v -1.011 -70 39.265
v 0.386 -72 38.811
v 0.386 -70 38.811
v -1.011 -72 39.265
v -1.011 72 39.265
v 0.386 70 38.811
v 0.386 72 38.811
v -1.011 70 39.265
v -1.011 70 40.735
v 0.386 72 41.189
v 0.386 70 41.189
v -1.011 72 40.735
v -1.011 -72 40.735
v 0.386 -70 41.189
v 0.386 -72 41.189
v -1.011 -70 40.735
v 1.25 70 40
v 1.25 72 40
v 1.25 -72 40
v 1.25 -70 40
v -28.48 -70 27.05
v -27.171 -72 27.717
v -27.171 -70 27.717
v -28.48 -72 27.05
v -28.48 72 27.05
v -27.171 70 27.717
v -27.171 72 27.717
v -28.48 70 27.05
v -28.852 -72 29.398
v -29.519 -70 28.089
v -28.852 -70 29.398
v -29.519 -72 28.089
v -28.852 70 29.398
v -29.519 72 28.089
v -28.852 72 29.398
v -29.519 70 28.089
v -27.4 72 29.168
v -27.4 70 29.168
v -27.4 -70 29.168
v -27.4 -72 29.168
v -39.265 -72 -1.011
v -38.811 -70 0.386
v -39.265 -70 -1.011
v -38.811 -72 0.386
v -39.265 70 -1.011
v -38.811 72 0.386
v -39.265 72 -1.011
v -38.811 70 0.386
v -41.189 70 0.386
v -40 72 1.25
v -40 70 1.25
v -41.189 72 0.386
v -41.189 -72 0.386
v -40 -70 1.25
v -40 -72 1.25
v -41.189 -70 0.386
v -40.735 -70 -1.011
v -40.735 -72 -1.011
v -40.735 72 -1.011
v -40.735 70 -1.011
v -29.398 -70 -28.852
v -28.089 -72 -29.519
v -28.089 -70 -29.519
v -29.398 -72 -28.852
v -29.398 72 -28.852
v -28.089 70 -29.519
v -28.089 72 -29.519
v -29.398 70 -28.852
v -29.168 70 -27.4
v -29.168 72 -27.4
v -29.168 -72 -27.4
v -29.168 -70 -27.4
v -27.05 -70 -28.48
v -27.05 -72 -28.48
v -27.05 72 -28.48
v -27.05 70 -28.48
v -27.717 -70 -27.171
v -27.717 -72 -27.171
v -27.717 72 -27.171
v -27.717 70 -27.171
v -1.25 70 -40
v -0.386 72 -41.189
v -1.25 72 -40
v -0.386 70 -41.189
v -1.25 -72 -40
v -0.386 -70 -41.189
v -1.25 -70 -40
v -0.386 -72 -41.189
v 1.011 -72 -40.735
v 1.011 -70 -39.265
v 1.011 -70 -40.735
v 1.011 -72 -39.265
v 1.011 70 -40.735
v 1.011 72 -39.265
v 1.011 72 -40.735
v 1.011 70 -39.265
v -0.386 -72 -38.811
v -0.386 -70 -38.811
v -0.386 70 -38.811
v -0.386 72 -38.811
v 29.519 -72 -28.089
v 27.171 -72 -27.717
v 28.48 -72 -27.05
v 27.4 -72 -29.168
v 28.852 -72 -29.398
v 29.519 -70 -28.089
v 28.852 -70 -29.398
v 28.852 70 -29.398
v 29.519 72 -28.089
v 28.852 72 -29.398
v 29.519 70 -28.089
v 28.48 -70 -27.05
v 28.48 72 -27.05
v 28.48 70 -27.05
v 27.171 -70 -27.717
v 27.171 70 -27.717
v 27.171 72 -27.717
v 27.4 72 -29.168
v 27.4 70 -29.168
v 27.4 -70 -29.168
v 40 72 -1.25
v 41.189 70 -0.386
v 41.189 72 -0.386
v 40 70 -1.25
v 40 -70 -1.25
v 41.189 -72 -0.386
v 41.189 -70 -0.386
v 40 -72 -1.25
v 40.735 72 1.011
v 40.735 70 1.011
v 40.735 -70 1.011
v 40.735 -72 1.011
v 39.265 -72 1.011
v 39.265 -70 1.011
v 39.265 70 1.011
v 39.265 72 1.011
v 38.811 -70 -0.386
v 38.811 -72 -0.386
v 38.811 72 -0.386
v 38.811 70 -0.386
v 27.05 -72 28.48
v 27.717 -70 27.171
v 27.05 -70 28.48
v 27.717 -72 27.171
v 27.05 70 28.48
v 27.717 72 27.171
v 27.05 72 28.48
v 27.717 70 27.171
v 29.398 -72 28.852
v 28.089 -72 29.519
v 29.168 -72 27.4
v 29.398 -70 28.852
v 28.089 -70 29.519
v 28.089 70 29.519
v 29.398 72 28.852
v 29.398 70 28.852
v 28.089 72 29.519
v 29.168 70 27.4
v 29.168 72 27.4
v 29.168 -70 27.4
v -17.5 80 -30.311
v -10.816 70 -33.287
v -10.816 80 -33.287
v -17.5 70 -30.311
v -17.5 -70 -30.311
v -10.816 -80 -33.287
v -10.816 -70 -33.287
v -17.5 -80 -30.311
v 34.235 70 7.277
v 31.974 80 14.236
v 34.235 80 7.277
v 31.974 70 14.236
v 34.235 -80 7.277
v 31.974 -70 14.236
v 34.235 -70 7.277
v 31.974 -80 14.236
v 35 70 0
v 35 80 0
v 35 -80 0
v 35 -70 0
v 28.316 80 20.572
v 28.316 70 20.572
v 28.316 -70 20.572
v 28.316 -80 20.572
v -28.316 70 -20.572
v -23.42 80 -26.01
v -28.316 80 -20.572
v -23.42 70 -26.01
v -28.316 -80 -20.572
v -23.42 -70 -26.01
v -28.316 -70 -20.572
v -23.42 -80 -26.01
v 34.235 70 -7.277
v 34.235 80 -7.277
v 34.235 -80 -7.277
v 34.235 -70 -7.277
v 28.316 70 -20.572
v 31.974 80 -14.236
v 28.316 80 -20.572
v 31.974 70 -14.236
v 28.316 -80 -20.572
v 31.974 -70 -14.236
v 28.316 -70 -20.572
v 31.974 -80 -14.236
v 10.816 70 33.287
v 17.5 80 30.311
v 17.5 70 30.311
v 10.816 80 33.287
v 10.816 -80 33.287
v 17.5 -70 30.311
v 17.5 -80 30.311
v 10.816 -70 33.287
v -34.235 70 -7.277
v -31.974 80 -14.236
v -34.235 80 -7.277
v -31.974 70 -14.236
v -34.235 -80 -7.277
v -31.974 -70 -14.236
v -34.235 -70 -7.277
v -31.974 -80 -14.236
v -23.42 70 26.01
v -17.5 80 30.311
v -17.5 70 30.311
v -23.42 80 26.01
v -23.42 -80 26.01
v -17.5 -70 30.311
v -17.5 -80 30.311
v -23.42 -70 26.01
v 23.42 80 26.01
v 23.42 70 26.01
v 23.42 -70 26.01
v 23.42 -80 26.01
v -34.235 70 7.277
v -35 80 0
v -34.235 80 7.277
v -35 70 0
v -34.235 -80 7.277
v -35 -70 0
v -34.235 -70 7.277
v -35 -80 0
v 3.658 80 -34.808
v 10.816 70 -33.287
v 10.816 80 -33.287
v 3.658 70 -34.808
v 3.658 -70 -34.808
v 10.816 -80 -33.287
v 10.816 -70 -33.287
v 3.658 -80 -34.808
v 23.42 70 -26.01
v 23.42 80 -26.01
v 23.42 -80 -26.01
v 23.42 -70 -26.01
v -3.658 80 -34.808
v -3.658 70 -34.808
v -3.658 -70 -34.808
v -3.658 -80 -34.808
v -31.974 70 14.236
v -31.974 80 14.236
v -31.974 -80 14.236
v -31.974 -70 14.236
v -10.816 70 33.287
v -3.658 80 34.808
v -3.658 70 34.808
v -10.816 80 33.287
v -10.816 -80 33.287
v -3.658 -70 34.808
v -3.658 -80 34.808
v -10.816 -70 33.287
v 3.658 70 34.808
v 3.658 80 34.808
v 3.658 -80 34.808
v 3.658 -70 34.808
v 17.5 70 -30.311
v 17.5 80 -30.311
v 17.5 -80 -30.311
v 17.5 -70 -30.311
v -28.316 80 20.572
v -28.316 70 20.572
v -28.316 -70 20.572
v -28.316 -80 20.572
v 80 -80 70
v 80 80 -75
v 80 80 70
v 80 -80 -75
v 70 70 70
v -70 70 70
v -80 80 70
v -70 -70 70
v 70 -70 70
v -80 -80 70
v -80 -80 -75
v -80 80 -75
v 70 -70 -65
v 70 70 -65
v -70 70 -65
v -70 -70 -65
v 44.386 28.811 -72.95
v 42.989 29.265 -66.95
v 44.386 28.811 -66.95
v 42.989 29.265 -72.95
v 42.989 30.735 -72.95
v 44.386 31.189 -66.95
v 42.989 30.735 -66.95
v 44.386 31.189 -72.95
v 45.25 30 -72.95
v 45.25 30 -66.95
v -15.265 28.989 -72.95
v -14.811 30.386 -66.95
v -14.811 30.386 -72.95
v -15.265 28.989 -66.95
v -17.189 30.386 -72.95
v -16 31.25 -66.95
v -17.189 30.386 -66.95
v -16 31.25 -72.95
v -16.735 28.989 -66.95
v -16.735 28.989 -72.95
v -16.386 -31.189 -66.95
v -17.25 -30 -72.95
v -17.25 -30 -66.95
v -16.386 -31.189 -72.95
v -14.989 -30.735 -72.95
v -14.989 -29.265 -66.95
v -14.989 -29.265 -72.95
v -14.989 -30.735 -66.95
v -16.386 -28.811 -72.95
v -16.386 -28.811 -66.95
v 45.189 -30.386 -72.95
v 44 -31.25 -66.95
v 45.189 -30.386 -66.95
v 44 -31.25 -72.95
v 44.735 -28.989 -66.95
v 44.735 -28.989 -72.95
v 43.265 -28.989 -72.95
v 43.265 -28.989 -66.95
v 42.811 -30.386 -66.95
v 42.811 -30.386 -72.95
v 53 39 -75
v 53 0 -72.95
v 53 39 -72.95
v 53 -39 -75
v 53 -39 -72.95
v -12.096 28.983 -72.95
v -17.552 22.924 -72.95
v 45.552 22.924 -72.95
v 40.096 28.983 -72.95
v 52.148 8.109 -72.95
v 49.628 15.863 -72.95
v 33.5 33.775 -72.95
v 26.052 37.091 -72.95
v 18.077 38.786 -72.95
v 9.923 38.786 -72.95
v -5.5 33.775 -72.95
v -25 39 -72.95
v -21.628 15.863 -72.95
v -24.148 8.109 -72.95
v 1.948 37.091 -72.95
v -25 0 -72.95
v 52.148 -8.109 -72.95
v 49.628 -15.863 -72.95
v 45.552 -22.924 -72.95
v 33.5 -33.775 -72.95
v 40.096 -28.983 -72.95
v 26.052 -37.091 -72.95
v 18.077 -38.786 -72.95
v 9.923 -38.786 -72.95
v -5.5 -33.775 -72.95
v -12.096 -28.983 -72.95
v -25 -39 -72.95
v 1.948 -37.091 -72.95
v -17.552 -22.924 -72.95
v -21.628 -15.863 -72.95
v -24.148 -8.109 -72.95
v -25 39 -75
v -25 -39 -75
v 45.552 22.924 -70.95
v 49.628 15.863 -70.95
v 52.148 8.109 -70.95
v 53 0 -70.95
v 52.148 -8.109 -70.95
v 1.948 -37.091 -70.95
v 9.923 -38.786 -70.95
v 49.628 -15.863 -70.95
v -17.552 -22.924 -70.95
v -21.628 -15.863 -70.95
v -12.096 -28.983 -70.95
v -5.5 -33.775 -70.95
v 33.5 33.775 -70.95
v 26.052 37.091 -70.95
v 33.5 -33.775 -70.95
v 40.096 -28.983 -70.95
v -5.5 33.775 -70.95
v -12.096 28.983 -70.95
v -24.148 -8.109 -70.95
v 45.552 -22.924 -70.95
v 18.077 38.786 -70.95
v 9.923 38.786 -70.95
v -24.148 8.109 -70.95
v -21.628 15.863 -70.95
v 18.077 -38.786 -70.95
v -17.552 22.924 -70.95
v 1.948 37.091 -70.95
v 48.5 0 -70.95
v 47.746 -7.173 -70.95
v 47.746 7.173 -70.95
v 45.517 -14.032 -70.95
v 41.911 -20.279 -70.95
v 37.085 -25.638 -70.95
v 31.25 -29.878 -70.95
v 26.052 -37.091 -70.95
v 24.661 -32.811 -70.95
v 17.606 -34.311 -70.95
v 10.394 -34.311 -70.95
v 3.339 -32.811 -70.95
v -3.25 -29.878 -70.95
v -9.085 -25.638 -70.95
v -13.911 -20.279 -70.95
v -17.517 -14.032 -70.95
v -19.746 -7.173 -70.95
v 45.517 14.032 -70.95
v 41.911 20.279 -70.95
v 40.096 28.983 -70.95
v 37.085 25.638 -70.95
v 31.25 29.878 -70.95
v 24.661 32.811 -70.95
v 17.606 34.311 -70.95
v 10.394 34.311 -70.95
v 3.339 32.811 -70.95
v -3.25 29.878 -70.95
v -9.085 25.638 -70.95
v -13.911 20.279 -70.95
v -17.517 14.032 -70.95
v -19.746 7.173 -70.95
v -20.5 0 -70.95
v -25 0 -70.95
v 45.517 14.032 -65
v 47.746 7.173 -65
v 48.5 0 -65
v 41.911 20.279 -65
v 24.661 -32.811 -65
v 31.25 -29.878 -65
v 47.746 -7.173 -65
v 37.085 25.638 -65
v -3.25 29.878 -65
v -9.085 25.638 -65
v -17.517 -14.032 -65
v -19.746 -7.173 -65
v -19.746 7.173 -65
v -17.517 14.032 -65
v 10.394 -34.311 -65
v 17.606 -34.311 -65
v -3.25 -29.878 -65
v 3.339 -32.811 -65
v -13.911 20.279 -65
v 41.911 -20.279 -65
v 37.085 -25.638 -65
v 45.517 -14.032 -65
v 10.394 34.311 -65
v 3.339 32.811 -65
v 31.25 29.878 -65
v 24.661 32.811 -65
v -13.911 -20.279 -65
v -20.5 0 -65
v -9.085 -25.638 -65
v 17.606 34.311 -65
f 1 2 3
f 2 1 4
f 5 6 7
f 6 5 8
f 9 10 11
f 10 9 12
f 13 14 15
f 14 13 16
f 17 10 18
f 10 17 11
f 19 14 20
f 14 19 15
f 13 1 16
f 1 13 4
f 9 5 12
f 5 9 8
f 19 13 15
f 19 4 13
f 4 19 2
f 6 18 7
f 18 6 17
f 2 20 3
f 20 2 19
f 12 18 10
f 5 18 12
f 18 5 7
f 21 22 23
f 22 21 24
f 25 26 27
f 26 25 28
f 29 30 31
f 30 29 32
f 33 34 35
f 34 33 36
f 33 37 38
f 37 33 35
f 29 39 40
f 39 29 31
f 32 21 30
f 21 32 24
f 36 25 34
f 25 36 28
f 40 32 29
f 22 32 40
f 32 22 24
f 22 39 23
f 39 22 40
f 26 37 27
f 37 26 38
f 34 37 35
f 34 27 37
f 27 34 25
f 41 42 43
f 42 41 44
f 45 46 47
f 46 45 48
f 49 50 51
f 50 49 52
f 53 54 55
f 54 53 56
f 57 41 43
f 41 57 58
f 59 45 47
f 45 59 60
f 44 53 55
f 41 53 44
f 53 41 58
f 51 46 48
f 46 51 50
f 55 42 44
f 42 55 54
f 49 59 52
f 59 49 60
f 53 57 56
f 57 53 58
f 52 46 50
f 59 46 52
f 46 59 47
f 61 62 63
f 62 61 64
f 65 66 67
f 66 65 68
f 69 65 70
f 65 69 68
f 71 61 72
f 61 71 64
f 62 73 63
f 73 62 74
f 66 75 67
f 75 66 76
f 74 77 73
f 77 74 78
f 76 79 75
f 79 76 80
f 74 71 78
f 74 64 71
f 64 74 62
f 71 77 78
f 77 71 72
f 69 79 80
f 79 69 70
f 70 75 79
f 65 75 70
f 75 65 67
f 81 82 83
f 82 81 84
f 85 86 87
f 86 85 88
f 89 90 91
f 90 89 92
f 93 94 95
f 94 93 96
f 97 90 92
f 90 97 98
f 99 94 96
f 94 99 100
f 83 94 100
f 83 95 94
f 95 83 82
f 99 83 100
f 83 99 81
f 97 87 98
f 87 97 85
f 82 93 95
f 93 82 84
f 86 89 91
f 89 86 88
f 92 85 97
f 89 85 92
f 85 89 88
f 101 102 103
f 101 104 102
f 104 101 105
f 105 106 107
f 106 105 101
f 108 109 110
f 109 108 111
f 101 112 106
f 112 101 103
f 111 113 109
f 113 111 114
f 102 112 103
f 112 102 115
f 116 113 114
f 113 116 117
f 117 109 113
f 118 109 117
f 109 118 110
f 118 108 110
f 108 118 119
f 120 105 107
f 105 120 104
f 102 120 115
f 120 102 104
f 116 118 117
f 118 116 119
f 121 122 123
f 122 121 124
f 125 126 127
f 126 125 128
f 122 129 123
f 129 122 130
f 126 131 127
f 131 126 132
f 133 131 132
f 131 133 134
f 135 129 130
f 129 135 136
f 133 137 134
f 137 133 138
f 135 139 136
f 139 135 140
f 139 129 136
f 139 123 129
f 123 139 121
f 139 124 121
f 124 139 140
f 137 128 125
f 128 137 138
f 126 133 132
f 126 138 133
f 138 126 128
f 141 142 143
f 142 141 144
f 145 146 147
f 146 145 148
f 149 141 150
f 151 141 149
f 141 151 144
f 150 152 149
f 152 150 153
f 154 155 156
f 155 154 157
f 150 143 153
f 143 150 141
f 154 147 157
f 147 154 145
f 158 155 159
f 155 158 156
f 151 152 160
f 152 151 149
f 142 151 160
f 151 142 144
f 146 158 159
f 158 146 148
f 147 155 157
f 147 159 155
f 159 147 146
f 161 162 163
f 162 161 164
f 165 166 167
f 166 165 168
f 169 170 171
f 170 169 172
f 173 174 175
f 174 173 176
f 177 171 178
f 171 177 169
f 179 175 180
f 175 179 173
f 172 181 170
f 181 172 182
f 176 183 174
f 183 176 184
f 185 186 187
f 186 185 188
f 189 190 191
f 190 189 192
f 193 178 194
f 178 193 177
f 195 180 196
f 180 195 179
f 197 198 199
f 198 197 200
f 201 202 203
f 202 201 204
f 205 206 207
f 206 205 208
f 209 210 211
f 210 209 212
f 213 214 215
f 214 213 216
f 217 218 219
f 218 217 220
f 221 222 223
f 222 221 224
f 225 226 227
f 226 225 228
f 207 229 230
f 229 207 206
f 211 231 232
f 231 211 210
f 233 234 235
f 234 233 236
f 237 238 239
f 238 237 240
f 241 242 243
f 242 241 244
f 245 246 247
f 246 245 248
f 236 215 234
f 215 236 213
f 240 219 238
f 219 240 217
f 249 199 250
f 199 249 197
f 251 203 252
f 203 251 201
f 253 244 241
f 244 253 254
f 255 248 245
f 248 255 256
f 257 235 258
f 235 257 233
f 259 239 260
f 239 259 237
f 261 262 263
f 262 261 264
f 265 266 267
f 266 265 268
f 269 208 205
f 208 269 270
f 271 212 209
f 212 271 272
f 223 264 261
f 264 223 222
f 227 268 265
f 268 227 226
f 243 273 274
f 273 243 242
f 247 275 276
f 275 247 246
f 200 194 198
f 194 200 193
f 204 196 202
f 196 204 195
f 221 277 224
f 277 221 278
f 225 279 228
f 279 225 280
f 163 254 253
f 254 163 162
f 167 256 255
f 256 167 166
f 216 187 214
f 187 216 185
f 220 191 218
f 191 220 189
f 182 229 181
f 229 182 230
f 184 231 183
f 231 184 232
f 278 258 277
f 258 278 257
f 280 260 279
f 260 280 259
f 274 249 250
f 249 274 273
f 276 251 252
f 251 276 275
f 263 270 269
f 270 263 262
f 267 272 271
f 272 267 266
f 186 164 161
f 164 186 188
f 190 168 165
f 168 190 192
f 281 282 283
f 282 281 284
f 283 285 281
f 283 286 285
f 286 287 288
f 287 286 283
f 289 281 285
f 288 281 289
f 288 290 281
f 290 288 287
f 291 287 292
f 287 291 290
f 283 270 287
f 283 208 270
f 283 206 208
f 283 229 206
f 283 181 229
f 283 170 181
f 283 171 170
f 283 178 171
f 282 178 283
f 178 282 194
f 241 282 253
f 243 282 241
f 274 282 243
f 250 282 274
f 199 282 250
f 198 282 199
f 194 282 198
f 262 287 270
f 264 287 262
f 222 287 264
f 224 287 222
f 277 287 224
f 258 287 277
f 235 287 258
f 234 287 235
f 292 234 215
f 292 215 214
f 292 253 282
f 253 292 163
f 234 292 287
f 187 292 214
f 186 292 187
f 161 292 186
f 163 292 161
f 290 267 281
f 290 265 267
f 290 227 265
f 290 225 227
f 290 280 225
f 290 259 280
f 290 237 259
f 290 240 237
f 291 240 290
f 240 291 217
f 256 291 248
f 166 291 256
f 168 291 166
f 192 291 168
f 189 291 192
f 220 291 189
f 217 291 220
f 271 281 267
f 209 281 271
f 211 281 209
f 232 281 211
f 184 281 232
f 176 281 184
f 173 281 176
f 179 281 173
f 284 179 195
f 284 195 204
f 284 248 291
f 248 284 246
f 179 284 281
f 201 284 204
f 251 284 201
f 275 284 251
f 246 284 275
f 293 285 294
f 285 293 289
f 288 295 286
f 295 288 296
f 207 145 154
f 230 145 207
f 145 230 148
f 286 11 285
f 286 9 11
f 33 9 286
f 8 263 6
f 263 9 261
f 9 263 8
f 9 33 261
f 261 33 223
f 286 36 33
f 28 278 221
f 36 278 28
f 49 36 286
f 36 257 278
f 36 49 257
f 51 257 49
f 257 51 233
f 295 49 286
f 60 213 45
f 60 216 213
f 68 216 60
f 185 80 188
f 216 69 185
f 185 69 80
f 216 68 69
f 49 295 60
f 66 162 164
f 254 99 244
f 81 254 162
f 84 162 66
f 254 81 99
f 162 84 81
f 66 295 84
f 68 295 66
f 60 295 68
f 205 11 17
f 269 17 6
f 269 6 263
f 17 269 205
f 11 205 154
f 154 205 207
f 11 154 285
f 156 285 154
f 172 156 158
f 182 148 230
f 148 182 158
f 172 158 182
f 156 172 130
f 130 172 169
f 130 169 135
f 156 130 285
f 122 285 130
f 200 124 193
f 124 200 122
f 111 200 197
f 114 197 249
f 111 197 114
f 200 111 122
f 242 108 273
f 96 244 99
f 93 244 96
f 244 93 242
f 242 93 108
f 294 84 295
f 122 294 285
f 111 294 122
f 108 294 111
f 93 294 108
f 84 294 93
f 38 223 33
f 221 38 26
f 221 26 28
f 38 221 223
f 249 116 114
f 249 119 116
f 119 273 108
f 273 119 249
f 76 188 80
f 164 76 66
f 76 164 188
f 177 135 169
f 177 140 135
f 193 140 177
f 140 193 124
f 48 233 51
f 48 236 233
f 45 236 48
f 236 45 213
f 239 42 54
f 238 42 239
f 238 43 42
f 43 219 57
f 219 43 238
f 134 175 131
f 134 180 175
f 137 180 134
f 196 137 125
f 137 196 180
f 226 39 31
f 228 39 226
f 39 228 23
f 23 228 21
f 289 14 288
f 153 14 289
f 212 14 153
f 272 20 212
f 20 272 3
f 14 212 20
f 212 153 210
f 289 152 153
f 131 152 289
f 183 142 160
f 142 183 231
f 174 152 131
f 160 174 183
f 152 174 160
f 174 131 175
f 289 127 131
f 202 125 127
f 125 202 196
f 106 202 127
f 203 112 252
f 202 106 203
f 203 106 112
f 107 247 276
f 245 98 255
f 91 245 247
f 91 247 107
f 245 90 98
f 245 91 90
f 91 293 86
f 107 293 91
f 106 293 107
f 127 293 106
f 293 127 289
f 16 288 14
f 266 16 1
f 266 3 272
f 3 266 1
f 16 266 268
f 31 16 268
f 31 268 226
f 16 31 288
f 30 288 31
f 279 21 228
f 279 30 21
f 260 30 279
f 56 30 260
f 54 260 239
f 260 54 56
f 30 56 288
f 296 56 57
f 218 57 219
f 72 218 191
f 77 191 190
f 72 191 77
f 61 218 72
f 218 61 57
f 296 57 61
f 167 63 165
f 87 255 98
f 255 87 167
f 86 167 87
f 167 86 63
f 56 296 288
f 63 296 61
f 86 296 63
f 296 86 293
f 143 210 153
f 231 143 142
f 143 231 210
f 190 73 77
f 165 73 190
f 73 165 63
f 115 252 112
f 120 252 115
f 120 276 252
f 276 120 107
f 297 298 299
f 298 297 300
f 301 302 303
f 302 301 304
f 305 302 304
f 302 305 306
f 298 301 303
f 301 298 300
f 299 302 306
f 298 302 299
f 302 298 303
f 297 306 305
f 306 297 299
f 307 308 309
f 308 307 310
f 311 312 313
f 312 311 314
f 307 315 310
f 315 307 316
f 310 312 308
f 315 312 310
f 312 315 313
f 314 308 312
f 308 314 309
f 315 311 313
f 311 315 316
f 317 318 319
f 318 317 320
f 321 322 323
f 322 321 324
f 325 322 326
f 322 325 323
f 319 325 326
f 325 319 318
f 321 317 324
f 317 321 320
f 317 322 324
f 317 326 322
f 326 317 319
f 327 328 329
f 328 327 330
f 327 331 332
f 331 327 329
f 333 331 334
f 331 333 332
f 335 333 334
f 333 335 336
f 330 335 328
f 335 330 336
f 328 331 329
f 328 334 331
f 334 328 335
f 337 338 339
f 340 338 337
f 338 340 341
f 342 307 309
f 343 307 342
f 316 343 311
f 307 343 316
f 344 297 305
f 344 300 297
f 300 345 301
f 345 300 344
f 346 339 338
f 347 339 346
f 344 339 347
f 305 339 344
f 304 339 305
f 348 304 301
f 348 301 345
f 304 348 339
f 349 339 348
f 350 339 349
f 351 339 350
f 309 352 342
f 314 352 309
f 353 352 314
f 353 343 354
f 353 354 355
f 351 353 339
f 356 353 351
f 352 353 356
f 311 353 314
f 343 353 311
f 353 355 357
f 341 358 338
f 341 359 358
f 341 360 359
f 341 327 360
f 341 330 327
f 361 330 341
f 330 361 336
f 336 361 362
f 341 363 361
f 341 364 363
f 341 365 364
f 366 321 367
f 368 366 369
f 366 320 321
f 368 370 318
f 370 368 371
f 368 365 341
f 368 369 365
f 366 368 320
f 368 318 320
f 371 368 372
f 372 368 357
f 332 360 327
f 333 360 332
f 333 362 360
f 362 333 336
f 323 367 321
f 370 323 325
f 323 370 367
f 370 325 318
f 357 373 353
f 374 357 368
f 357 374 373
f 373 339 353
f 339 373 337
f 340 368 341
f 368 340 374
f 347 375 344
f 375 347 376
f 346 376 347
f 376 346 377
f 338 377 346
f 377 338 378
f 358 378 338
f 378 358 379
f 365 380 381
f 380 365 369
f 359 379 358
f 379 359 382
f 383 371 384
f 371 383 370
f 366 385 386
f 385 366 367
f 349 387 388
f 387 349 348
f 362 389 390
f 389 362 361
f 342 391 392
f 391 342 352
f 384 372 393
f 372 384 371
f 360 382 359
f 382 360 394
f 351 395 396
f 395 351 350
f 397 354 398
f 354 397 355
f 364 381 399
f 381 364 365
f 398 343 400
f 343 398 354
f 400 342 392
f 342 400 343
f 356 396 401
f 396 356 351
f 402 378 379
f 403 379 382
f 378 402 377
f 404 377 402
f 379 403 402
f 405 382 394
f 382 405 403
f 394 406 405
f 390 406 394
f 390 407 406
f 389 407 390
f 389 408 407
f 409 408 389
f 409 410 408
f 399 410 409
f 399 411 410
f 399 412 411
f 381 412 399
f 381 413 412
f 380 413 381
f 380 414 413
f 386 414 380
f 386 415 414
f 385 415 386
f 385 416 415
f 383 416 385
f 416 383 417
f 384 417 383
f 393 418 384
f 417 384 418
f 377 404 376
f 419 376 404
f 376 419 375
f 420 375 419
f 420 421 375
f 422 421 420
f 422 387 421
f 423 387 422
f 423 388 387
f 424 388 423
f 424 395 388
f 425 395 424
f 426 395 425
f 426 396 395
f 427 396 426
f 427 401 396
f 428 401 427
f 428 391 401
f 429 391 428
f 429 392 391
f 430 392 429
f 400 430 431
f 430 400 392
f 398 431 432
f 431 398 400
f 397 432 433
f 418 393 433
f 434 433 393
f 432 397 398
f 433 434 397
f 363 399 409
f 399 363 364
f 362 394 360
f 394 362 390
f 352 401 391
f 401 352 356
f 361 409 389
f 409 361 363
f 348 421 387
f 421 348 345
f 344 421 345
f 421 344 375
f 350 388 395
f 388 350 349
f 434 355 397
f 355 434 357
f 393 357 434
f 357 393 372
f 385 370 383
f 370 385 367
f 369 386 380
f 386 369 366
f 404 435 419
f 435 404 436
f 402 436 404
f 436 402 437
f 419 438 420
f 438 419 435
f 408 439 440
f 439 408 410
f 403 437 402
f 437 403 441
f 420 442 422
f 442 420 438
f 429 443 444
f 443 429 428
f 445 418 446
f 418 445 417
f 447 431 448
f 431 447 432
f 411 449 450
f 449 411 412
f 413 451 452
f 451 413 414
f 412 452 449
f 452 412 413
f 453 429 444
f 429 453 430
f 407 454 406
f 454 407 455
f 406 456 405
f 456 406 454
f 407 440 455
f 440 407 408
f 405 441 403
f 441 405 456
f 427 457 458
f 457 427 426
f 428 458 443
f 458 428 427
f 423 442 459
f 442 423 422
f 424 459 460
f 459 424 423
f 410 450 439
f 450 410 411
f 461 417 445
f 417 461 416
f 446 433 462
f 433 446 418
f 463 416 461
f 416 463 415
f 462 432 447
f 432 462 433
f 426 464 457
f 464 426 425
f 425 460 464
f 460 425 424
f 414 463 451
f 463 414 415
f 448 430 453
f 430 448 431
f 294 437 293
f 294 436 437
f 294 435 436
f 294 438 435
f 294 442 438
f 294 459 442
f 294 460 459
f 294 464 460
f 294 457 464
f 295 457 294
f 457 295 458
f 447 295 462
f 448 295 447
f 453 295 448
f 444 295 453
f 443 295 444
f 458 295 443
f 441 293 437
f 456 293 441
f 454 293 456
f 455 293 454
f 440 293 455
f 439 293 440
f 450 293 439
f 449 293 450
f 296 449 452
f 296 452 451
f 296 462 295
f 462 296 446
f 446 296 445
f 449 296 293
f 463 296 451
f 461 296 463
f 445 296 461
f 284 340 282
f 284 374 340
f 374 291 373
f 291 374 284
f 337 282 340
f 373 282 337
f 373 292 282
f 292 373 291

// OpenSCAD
// Y trafo screw dist  = 46mm
// Z trafo max thic    = 38mm
// Y pot-pot dist      = 18mm
// Z pot front depth   =  5mm

tol=0.1;    // [mm]
Ds  = 69;   // speaker
DsH =2.5;   // holes
SQs = 78;   // square
SQh = 60;     // sq for holes
Dm  = 70;   // membrane
perf = 4;   // perforations
width=10;   // thickness
prop = 2;
xlen = prop*Dm;
ylen = prop*Dm;
zlen = prop*Dm;
screwQuant = 8;

difference()
{
    cube([xlen+2*width, ylen+2*width, zlen],center = true);
    
    cube([xlen, ylen, zlen+tol], center = true);
    
    rotate([90,0,0])
    {
        cylinder(h=ylen+2*width+tol, d=Dm, center=true);
        for(i=[0:1:screwQuant-1])
        {
            rotate([0,0,i*360/screwQuant])
            {
                translate([0,DsH*2+Dm/2,0])
                {
                    cylinder(h=ylen+perf, d=DsH, center=true);
                }
            }
        }
    }
    /*rotate([0,0,0])
    {
        cylinder(h=xlen+2*width+tol, d=Dm, center=true);
        for(i=[0:1:screwQuant-1])
        {
            rotate([0,0,i*360/screwQuant])
            {
                translate([0,DsH*2+Dm/2,0])
                {
                    cylinder(h=ylen+perf, d=DsH, center=true);
                }
            }
        }
    }*/
}

translate([0,0,-zlen/2])
{
    difference()
    {
        cube([xlen+2*width,ylen+2*width,width],center=true);
        
        translate([0.1*xlen,0,0])
        {
            cylinder(h=width+tol, d=Ds, center=true);
            translate([0,0,(-width)/2])
            {
                cube([SQs,SQs,perf+tol],center=true);
                cylinder(h=2*perf+tol, d=SQs, center=true);
                
                for(i=[0:90:270])
                {
                    rotate([0,0,i])
                    {
                        translate([SQh/2,SQh/2,0])
                        {
                            cylinder(h=4*perf+tol, d=DsH, center=true);
                        }
                    }
                }
            }
        }
    }
}
